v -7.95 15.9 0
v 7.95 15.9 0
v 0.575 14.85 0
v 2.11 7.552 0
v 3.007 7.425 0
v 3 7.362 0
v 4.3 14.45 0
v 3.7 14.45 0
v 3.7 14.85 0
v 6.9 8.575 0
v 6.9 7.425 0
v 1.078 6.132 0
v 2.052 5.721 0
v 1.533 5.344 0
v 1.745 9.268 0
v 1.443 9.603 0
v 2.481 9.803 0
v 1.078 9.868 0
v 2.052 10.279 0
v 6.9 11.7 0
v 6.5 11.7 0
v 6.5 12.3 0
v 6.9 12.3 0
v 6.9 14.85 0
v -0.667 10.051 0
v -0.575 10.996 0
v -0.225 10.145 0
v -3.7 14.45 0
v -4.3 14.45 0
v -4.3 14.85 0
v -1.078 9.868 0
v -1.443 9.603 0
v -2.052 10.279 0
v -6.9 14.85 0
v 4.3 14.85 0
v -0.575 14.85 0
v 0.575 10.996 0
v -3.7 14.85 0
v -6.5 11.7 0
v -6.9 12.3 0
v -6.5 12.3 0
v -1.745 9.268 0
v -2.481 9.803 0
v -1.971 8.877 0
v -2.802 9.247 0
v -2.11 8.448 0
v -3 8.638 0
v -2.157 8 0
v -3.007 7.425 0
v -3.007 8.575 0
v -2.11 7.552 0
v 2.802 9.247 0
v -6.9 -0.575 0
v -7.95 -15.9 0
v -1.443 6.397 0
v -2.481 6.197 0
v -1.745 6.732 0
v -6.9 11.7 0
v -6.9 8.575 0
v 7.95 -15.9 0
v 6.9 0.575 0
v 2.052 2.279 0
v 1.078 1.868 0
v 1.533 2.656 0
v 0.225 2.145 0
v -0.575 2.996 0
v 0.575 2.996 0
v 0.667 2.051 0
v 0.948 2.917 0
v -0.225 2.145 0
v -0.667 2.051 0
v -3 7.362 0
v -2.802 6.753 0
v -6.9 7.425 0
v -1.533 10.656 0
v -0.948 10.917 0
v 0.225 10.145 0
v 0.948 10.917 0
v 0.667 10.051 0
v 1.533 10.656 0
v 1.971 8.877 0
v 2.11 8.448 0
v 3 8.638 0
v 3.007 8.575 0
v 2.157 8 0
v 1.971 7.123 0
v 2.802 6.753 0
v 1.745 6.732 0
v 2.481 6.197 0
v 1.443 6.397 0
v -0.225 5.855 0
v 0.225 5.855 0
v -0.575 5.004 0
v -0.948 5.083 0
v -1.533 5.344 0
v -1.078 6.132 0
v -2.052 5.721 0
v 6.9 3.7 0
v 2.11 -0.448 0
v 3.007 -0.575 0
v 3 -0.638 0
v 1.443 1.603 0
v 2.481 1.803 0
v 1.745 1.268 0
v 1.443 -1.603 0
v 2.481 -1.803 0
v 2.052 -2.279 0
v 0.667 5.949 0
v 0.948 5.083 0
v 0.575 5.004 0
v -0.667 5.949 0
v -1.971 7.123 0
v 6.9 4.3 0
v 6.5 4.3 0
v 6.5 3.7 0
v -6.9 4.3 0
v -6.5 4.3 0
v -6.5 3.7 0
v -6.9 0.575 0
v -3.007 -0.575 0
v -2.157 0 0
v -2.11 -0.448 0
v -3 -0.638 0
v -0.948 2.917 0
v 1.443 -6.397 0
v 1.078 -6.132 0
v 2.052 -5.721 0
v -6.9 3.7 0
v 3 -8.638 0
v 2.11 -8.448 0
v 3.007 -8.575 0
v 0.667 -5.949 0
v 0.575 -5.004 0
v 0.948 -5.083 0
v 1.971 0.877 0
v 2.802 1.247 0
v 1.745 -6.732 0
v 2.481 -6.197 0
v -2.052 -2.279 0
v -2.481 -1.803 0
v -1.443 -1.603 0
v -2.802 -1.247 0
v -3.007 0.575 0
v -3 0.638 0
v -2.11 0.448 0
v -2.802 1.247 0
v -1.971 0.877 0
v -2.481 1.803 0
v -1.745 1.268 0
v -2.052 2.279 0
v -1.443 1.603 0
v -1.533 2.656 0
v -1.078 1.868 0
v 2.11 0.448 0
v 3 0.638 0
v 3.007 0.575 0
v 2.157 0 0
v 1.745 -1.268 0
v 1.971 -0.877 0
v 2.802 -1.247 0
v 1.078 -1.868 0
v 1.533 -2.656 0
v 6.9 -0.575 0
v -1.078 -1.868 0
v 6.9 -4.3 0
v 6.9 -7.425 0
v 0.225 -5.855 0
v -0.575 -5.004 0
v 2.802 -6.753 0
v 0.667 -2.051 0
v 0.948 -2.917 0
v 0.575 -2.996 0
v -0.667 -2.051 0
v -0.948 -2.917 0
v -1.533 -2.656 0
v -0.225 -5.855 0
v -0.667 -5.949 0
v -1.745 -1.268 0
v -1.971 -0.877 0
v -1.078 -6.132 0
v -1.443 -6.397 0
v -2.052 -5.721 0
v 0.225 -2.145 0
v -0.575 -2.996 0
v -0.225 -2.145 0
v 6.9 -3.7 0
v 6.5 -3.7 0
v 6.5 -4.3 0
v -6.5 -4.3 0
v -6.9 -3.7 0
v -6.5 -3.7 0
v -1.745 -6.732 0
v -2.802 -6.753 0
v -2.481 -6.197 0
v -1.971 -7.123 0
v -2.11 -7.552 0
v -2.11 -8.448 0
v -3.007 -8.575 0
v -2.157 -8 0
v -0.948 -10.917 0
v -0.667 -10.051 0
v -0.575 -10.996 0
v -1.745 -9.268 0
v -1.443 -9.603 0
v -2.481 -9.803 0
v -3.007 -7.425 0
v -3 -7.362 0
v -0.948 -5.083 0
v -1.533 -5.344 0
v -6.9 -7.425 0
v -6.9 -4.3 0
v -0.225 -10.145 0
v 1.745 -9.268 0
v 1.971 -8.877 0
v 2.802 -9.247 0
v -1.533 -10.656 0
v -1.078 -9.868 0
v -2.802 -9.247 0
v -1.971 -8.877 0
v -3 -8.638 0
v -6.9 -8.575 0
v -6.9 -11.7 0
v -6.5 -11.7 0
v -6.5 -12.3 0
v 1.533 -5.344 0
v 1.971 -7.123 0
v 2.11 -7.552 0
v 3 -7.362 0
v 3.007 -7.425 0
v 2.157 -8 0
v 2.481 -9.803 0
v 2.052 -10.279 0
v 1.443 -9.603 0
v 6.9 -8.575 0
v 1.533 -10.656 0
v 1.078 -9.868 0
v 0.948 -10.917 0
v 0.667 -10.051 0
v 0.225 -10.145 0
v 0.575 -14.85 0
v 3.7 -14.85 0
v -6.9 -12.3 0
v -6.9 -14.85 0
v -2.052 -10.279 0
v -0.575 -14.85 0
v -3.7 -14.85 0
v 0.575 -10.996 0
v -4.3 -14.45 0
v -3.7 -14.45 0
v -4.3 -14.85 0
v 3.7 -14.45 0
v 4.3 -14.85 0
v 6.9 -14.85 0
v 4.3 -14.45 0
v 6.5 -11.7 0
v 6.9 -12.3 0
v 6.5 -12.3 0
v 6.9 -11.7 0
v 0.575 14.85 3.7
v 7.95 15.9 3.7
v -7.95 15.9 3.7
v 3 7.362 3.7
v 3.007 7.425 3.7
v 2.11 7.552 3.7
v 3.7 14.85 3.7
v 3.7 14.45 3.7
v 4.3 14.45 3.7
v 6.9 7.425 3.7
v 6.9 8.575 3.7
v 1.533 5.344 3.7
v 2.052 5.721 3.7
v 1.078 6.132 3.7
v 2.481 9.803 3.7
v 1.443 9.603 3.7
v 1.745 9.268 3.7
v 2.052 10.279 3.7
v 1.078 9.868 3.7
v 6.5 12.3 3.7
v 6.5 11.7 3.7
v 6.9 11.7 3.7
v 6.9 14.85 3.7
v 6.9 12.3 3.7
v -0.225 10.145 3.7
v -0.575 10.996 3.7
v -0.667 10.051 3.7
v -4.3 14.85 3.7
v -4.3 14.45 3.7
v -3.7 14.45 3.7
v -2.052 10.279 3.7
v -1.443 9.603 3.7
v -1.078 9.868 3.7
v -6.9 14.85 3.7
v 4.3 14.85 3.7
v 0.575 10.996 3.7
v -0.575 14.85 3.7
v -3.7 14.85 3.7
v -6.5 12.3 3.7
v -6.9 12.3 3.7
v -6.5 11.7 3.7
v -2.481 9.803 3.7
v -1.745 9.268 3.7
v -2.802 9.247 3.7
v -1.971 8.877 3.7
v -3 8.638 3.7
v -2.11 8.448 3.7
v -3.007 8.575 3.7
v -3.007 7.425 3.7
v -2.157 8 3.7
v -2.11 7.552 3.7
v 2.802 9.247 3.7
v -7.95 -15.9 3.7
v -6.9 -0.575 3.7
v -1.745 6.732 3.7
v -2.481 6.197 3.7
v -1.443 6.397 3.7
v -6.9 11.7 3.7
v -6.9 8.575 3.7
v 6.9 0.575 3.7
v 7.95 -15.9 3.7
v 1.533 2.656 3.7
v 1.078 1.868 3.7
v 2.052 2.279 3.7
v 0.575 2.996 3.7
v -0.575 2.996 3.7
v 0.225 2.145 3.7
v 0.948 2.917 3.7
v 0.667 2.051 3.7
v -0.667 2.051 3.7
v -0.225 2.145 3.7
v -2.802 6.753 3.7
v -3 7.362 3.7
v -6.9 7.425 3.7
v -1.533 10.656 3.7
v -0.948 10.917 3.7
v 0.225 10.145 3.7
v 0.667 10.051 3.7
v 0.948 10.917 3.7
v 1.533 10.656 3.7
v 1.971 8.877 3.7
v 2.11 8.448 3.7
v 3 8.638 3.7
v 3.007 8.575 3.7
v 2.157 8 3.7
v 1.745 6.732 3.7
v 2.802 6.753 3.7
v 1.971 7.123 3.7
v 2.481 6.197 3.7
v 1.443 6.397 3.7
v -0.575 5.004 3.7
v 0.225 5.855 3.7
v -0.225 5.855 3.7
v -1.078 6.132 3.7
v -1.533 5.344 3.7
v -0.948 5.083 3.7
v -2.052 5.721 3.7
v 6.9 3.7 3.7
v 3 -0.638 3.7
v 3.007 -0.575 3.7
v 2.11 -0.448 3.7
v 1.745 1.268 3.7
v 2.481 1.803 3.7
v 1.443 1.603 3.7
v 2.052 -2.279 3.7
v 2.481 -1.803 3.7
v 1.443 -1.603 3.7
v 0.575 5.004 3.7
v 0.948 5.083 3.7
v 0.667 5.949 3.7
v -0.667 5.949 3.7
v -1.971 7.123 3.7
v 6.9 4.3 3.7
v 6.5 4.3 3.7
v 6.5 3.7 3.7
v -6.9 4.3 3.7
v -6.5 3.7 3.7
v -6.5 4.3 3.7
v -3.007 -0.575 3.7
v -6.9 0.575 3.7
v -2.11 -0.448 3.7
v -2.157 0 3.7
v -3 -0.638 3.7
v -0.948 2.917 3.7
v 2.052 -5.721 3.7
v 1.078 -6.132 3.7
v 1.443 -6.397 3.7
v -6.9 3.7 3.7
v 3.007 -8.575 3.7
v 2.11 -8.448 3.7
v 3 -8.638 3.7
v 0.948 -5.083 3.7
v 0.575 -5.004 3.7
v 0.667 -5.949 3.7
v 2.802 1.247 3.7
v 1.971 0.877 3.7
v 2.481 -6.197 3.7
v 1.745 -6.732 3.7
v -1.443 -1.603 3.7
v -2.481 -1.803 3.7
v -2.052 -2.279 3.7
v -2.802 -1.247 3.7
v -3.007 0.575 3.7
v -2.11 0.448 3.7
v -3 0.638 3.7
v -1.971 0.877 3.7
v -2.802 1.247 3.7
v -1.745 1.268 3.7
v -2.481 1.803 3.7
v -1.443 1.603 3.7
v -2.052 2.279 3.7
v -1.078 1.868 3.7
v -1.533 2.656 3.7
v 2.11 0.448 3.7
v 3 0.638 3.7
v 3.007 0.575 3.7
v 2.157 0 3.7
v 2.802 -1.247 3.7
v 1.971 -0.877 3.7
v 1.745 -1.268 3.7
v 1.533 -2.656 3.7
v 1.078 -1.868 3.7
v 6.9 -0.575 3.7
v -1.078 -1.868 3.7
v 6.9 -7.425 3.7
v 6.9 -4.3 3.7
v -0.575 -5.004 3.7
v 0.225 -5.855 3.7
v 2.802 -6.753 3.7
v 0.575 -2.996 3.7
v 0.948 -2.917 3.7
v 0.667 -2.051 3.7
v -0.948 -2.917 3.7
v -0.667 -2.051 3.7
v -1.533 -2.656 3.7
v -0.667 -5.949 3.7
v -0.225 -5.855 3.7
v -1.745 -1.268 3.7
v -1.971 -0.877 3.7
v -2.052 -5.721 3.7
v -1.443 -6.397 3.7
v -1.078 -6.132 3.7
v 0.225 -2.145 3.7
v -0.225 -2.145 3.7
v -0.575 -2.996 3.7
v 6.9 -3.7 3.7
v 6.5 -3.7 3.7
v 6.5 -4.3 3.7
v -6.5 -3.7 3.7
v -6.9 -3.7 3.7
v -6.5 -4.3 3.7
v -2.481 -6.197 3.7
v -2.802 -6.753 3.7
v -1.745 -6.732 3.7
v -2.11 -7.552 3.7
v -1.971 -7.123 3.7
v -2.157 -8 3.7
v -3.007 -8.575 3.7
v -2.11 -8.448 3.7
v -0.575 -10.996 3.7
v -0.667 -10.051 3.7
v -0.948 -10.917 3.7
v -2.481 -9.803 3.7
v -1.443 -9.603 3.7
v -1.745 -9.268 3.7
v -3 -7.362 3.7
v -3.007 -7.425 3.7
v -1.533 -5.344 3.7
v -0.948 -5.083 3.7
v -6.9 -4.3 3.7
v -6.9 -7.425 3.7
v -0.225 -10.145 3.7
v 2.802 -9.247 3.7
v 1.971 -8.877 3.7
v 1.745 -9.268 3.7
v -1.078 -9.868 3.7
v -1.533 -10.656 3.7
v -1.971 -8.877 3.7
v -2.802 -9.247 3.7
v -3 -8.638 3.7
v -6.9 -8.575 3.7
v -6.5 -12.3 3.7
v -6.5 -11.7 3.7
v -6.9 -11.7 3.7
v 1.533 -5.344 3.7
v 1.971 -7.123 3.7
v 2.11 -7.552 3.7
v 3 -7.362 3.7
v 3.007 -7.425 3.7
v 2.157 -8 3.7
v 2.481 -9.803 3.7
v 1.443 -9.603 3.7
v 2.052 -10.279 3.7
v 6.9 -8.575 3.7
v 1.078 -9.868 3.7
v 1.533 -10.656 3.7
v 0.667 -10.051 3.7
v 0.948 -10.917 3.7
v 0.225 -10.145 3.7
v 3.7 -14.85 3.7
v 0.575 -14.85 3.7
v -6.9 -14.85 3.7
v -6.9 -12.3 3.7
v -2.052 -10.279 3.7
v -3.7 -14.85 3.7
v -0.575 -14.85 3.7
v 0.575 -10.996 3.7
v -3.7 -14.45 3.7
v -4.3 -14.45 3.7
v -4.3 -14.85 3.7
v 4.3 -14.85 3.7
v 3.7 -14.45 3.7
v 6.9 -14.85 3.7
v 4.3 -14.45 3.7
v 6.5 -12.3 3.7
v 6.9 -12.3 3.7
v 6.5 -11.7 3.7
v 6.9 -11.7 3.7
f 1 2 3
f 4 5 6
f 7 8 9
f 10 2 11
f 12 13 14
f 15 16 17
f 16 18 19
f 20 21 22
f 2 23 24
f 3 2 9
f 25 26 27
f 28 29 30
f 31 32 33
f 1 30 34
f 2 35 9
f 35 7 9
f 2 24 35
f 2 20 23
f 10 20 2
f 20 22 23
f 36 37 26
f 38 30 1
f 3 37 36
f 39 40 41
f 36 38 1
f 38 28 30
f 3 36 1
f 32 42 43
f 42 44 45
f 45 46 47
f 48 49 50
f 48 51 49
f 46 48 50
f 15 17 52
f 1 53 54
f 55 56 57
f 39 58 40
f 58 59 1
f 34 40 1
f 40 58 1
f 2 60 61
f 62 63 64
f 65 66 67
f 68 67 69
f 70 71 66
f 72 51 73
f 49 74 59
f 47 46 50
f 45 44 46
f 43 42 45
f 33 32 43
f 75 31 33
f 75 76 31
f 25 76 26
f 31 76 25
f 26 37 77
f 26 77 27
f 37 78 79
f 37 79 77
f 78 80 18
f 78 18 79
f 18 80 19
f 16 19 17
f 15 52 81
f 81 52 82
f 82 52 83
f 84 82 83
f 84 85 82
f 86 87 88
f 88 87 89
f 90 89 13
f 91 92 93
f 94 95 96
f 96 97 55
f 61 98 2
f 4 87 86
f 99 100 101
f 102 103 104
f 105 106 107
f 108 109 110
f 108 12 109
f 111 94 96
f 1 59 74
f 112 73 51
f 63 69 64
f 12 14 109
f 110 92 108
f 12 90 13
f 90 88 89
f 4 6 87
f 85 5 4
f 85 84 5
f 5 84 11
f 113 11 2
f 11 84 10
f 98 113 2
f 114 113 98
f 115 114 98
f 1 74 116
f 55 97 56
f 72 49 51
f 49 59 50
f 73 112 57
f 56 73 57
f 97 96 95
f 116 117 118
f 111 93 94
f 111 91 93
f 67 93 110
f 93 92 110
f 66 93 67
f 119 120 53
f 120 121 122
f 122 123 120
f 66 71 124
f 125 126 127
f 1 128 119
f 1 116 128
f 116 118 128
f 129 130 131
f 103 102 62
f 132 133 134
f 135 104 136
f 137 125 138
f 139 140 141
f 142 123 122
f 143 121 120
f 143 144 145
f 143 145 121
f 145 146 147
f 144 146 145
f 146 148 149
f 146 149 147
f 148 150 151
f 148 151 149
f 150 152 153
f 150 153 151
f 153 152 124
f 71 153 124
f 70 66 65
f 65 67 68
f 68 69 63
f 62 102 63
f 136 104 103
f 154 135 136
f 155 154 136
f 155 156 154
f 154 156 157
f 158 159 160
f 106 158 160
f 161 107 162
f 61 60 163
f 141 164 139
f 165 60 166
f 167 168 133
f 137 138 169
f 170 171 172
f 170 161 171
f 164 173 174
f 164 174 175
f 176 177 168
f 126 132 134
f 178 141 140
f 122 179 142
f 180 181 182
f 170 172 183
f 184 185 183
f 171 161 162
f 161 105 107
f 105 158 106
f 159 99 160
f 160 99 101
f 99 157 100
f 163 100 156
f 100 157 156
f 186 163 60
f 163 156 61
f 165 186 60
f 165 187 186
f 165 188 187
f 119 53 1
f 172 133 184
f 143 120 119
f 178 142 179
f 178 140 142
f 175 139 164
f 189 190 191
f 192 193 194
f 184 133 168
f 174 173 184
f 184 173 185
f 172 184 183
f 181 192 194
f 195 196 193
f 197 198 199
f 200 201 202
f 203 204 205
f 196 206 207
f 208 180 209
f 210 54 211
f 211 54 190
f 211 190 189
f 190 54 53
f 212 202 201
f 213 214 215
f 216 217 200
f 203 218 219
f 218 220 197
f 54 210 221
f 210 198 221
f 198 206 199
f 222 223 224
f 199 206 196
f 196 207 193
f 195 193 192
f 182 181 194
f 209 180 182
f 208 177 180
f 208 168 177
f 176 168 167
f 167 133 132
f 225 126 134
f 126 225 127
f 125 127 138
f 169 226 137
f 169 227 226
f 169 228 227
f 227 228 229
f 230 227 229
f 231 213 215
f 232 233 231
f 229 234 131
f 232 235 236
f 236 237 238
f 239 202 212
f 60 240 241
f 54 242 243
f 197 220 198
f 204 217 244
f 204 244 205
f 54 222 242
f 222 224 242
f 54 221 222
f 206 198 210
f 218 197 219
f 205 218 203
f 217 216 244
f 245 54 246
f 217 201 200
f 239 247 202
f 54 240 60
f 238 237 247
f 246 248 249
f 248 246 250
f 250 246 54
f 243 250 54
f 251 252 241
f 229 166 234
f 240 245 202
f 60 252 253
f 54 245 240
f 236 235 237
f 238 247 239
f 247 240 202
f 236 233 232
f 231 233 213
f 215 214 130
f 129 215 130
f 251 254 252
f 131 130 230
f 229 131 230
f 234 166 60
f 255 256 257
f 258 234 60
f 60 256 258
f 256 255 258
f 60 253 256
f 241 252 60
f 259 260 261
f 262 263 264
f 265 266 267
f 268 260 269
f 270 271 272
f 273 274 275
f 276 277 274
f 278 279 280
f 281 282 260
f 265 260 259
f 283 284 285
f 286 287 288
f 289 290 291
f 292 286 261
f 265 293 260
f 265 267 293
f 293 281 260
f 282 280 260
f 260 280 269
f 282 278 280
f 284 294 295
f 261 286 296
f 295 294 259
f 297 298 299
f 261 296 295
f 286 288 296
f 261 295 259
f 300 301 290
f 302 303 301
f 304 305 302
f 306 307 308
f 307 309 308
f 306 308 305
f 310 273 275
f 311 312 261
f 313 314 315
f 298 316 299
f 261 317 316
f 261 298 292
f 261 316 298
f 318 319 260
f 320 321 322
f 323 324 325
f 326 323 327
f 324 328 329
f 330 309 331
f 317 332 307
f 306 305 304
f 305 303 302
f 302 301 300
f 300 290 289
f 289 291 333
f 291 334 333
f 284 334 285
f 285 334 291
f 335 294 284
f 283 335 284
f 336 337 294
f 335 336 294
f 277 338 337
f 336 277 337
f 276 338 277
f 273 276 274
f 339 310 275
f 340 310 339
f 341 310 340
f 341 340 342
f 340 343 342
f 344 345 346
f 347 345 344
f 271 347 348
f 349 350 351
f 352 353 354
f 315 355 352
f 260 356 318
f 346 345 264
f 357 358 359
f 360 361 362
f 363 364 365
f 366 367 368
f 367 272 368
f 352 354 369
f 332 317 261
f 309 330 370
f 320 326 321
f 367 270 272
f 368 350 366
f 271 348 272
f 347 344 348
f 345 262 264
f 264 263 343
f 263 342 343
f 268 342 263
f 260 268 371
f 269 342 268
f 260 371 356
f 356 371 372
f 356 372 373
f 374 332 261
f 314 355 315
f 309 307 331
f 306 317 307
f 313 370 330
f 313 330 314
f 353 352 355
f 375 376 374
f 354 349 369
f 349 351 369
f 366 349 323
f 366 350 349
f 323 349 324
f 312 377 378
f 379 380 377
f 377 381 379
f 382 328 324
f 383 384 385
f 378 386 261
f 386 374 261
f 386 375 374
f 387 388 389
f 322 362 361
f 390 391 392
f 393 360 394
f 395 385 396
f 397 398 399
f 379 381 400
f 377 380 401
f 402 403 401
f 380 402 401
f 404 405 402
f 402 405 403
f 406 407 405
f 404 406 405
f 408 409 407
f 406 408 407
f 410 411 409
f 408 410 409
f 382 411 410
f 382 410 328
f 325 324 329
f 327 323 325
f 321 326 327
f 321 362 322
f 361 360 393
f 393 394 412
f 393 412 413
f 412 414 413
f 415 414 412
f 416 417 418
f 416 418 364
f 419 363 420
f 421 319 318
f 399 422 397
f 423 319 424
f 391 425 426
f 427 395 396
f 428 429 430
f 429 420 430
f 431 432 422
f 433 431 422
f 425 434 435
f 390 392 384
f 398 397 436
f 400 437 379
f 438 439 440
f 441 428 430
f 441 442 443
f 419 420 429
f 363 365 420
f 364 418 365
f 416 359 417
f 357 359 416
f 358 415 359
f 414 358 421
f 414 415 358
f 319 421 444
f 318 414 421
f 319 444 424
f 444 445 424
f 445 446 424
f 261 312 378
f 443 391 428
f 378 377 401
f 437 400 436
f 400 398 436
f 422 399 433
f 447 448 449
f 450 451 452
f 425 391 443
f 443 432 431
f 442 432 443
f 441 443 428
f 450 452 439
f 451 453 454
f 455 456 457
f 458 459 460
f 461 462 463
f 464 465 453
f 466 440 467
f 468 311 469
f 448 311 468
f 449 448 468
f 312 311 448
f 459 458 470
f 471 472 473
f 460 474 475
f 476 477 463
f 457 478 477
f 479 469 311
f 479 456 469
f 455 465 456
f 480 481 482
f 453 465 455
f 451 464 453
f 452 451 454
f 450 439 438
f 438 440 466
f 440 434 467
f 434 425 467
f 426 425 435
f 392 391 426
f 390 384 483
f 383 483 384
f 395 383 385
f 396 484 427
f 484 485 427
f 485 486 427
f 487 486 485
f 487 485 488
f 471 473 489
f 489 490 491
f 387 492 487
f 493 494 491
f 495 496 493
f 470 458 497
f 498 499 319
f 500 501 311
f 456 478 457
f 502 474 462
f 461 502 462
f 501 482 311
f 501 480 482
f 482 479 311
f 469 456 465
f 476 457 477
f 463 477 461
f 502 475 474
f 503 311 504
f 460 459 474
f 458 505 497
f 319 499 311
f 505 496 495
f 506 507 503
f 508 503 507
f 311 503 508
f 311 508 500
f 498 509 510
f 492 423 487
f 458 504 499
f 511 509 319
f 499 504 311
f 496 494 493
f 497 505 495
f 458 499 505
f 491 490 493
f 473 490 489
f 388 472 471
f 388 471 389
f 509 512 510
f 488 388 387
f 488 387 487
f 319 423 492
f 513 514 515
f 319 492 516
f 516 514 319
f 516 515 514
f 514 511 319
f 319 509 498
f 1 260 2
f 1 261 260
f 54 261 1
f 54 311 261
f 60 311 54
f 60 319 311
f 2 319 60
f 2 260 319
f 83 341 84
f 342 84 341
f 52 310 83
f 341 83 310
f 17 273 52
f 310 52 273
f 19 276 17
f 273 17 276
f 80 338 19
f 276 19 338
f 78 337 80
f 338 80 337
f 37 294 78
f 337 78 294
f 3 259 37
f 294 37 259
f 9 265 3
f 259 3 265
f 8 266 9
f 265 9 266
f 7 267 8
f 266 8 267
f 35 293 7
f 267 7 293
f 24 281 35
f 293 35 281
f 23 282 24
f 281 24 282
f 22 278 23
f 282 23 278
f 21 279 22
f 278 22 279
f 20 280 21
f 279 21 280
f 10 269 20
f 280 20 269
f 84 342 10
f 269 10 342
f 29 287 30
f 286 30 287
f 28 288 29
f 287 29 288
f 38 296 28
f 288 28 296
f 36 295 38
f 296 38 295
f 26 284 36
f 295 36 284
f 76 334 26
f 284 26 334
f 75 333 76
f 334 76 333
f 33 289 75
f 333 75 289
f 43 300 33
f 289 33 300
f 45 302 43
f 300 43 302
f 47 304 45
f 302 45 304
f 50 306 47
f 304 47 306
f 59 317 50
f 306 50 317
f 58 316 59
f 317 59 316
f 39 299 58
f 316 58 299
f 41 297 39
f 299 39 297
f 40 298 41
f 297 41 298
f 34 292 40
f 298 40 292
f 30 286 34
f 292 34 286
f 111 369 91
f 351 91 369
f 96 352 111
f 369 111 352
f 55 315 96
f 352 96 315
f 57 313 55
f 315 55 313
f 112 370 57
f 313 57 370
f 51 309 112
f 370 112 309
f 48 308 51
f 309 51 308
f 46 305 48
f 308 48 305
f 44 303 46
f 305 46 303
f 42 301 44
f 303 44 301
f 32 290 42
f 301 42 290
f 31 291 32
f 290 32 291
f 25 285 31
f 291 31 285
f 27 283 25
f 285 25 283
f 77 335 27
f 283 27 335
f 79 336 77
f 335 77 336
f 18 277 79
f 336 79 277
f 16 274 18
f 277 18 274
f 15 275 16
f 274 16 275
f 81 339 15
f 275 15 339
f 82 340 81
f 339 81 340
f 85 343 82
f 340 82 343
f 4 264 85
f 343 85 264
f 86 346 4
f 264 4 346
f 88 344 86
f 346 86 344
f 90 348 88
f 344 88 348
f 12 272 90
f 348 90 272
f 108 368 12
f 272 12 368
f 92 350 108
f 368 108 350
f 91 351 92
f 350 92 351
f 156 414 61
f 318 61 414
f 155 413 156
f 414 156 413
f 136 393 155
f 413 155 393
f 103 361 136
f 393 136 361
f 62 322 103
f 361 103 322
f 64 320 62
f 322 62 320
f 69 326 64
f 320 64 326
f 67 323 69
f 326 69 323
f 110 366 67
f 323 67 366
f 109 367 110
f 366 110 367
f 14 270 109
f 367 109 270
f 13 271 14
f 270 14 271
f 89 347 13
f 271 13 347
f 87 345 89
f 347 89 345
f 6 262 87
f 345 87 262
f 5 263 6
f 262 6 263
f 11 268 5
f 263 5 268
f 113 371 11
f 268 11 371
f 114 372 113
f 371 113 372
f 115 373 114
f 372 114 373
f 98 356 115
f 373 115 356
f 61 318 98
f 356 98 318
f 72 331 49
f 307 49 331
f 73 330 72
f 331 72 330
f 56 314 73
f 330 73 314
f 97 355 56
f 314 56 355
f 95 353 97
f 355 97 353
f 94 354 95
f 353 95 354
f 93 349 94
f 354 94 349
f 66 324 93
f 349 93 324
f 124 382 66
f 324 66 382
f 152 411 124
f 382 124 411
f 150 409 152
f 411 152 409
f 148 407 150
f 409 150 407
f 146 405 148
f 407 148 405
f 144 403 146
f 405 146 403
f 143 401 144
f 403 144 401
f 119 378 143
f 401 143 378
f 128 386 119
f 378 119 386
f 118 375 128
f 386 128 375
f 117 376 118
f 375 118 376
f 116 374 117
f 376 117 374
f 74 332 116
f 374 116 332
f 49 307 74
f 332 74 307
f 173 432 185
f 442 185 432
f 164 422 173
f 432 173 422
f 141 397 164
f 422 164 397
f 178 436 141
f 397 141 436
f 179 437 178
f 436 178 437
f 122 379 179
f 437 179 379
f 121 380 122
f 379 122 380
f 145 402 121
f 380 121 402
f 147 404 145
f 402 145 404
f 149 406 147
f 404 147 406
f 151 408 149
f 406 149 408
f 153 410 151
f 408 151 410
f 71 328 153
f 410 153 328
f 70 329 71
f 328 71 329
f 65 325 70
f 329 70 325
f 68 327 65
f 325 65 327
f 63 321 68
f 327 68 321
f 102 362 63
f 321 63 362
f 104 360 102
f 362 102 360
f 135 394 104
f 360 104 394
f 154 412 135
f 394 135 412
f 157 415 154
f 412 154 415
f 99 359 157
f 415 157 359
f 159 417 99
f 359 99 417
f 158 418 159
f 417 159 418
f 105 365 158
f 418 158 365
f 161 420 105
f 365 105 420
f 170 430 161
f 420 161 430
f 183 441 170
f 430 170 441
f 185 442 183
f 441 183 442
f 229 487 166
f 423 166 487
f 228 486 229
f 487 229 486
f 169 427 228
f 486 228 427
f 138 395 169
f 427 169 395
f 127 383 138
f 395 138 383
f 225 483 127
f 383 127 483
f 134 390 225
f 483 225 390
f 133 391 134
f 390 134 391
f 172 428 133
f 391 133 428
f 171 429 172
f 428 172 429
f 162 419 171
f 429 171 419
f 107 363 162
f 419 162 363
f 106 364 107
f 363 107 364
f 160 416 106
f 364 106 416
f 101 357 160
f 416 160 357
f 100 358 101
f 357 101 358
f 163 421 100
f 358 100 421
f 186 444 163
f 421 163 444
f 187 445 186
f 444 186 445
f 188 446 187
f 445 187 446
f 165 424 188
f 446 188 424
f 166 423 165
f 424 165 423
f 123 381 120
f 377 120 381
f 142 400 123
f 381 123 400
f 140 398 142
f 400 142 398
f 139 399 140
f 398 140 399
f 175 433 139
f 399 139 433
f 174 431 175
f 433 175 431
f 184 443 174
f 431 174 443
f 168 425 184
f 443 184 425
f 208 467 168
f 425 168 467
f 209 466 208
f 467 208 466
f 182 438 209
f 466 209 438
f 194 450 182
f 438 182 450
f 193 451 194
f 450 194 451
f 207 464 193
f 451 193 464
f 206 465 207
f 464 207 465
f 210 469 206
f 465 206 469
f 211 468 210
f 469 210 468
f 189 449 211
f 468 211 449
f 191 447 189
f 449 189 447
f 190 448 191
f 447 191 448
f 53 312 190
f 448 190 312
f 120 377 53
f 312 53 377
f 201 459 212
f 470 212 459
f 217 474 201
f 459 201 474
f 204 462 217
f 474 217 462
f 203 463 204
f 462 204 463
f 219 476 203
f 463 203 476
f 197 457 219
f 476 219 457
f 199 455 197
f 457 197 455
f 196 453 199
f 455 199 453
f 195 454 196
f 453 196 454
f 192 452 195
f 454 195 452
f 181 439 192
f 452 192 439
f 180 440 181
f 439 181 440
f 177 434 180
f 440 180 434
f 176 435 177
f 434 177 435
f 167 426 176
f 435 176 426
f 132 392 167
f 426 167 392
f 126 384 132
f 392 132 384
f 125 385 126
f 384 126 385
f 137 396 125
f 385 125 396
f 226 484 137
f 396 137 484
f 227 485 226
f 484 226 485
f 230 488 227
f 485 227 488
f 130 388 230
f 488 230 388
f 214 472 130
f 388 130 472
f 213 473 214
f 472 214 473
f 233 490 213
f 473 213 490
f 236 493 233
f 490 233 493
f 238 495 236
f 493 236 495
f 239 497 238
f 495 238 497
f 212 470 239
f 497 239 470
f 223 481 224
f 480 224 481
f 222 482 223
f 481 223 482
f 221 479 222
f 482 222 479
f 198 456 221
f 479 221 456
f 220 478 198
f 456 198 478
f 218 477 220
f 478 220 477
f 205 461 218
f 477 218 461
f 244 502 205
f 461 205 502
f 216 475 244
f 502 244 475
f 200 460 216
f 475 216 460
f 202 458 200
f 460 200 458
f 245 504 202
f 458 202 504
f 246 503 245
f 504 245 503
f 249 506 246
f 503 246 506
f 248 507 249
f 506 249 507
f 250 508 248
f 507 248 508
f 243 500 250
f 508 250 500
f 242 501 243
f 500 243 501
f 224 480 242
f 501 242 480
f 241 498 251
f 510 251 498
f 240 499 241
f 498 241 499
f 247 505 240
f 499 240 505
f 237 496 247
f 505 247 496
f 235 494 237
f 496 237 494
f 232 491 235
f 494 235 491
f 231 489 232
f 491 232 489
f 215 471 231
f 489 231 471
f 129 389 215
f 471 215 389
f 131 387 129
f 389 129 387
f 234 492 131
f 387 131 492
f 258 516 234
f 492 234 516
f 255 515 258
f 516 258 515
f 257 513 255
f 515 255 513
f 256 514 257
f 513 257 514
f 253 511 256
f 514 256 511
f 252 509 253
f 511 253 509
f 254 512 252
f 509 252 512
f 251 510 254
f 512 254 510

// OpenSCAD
/* [Plate Dimensions] */

// how many studs in the X-direction
studCountX = 2;
// how many studs in the Y-direction
studCountY = 4;
// thickness of plate
plateThickness = 3.7;

/* [Hidden] */
centerCircleOD = 6.134;
centerCircleID = 4.314;
offsetThickness = 1.05;
$fn = 30;

// calculations // 
plateWidth = studCountX*7.95;
plateHeight = studCountY*7.95;
CCOr = centerCircleOD/2;
CCIr = centerCircleID/2;

module doubleFemalePlate4() {
	linear_extrude(plateThickness)
	union() {
		// border of piece
		difference() {
			union() {
				square([plateWidth,plateHeight],true);
			}
			union() {
				square([plateWidth - 2*offsetThickness,plateHeight - 2*offsetThickness],true);
			}
		}

		union() {
			// center circle
			difference() {
				// base shape
				union() {
					for (i = [0:studCountX - 2]) {
						for (j = [0:studCountY - 2]) {
							// base circle
							translate([-4*(studCountX-2) + 8*i,-4*(studCountY-2) + 8*j])
							circle(CCOr,true);
							translate([-4*(studCountX-2) + 8*i,0])
							square([1.15,plateHeight - 2*offsetThickness],true);

							translate([0,-4*(studCountY-2) + 8*j])
							square([plateWidth - 2*offsetThickness,1.15],true);
						}
					}

					// tessellated poles, spokes and crossed reinforcing beams
					for (i = [0:studCountX - 1]) {
						for (j = [0:studCountY - 1]) {
							// place stud spokes here
							// translate([8*(i - studCountX),0])
							translate([-4*(studCountX - 1) + 8*i,(plateHeight/2 - offsetThickness - 0.2)])
							square([0.6,0.4],true);

							translate([(plateWidth/2 - offsetThickness - 0.2),-4*(studCountY - 1) + 8*j])
							square([0.4,0.6],true);

							// mirrored spokes
							mirror([0,1,0])
							translate([-4*(studCountX - 1) + 8*i,(plateHeight/2 - offsetThickness - 0.2)])
							square([0.6,0.4],true);

							mirror([1,0,0])
							translate([(plateWidth/2 - offsetThickness - 0.2),-4*(studCountY - 1) + 8*j])
							square([0.4,0.6],true);
						}
					}
				}

				// cutting tool
				for (i = [0:studCountX - 2]) {
					for (j = [0:studCountY - 2]) {
						// tool body cut
						translate([-4*(studCountX-2) + 8*i,-4*(studCountY-2) + 8*j])
						circle(CCIr,true);
					}
				}
			}
		}
	}
}

module doubleFemalePlateThin1() {
	linear_extrude(plateThickness)
	union() {
		// border of piece
		difference() {
			union() {
				square([plateWidth,plateHeight],true);
			}
			union() {
				square([plateWidth - 2*offsetThickness,plateHeight - 2*offsetThickness],true);
			}
		}

		union() {
			// tessellated spokes
			for (i = [0:studCountX - 1]) {
				for (j = [0:studCountY - 1]) {
					// place stud spokes here
					// translate([8*(i - studCountX),0])
					translate([-4*(studCountX - 1) + 8*i,(plateHeight/2 - offsetThickness - 0.2)])
					square([0.6,0.4],true);
					translate([(plateWidth/2 - offsetThickness - 0.2),-4*(studCountY - 1) + 8*j])
					square([0.4,0.6],true);
					// mirrored spokes
					mirror([0,1,0])
					translate([-4*(studCountX - 1) + 8*i,(plateHeight/2 - offsetThickness - 0.2)])
					square([0.6,0.4],true);
					mirror([1,0,0])
					translate([(plateWidth/2 - offsetThickness - 0.2),-4*(studCountY - 1) + 8*j])
					square([0.4,0.6],true);
				}
			}
		}
	}
}

if (studCountY < 2 || studCountX < 2) {
	doubleFemalePlateThin1();
} else {
	doubleFemalePlate4();
}
